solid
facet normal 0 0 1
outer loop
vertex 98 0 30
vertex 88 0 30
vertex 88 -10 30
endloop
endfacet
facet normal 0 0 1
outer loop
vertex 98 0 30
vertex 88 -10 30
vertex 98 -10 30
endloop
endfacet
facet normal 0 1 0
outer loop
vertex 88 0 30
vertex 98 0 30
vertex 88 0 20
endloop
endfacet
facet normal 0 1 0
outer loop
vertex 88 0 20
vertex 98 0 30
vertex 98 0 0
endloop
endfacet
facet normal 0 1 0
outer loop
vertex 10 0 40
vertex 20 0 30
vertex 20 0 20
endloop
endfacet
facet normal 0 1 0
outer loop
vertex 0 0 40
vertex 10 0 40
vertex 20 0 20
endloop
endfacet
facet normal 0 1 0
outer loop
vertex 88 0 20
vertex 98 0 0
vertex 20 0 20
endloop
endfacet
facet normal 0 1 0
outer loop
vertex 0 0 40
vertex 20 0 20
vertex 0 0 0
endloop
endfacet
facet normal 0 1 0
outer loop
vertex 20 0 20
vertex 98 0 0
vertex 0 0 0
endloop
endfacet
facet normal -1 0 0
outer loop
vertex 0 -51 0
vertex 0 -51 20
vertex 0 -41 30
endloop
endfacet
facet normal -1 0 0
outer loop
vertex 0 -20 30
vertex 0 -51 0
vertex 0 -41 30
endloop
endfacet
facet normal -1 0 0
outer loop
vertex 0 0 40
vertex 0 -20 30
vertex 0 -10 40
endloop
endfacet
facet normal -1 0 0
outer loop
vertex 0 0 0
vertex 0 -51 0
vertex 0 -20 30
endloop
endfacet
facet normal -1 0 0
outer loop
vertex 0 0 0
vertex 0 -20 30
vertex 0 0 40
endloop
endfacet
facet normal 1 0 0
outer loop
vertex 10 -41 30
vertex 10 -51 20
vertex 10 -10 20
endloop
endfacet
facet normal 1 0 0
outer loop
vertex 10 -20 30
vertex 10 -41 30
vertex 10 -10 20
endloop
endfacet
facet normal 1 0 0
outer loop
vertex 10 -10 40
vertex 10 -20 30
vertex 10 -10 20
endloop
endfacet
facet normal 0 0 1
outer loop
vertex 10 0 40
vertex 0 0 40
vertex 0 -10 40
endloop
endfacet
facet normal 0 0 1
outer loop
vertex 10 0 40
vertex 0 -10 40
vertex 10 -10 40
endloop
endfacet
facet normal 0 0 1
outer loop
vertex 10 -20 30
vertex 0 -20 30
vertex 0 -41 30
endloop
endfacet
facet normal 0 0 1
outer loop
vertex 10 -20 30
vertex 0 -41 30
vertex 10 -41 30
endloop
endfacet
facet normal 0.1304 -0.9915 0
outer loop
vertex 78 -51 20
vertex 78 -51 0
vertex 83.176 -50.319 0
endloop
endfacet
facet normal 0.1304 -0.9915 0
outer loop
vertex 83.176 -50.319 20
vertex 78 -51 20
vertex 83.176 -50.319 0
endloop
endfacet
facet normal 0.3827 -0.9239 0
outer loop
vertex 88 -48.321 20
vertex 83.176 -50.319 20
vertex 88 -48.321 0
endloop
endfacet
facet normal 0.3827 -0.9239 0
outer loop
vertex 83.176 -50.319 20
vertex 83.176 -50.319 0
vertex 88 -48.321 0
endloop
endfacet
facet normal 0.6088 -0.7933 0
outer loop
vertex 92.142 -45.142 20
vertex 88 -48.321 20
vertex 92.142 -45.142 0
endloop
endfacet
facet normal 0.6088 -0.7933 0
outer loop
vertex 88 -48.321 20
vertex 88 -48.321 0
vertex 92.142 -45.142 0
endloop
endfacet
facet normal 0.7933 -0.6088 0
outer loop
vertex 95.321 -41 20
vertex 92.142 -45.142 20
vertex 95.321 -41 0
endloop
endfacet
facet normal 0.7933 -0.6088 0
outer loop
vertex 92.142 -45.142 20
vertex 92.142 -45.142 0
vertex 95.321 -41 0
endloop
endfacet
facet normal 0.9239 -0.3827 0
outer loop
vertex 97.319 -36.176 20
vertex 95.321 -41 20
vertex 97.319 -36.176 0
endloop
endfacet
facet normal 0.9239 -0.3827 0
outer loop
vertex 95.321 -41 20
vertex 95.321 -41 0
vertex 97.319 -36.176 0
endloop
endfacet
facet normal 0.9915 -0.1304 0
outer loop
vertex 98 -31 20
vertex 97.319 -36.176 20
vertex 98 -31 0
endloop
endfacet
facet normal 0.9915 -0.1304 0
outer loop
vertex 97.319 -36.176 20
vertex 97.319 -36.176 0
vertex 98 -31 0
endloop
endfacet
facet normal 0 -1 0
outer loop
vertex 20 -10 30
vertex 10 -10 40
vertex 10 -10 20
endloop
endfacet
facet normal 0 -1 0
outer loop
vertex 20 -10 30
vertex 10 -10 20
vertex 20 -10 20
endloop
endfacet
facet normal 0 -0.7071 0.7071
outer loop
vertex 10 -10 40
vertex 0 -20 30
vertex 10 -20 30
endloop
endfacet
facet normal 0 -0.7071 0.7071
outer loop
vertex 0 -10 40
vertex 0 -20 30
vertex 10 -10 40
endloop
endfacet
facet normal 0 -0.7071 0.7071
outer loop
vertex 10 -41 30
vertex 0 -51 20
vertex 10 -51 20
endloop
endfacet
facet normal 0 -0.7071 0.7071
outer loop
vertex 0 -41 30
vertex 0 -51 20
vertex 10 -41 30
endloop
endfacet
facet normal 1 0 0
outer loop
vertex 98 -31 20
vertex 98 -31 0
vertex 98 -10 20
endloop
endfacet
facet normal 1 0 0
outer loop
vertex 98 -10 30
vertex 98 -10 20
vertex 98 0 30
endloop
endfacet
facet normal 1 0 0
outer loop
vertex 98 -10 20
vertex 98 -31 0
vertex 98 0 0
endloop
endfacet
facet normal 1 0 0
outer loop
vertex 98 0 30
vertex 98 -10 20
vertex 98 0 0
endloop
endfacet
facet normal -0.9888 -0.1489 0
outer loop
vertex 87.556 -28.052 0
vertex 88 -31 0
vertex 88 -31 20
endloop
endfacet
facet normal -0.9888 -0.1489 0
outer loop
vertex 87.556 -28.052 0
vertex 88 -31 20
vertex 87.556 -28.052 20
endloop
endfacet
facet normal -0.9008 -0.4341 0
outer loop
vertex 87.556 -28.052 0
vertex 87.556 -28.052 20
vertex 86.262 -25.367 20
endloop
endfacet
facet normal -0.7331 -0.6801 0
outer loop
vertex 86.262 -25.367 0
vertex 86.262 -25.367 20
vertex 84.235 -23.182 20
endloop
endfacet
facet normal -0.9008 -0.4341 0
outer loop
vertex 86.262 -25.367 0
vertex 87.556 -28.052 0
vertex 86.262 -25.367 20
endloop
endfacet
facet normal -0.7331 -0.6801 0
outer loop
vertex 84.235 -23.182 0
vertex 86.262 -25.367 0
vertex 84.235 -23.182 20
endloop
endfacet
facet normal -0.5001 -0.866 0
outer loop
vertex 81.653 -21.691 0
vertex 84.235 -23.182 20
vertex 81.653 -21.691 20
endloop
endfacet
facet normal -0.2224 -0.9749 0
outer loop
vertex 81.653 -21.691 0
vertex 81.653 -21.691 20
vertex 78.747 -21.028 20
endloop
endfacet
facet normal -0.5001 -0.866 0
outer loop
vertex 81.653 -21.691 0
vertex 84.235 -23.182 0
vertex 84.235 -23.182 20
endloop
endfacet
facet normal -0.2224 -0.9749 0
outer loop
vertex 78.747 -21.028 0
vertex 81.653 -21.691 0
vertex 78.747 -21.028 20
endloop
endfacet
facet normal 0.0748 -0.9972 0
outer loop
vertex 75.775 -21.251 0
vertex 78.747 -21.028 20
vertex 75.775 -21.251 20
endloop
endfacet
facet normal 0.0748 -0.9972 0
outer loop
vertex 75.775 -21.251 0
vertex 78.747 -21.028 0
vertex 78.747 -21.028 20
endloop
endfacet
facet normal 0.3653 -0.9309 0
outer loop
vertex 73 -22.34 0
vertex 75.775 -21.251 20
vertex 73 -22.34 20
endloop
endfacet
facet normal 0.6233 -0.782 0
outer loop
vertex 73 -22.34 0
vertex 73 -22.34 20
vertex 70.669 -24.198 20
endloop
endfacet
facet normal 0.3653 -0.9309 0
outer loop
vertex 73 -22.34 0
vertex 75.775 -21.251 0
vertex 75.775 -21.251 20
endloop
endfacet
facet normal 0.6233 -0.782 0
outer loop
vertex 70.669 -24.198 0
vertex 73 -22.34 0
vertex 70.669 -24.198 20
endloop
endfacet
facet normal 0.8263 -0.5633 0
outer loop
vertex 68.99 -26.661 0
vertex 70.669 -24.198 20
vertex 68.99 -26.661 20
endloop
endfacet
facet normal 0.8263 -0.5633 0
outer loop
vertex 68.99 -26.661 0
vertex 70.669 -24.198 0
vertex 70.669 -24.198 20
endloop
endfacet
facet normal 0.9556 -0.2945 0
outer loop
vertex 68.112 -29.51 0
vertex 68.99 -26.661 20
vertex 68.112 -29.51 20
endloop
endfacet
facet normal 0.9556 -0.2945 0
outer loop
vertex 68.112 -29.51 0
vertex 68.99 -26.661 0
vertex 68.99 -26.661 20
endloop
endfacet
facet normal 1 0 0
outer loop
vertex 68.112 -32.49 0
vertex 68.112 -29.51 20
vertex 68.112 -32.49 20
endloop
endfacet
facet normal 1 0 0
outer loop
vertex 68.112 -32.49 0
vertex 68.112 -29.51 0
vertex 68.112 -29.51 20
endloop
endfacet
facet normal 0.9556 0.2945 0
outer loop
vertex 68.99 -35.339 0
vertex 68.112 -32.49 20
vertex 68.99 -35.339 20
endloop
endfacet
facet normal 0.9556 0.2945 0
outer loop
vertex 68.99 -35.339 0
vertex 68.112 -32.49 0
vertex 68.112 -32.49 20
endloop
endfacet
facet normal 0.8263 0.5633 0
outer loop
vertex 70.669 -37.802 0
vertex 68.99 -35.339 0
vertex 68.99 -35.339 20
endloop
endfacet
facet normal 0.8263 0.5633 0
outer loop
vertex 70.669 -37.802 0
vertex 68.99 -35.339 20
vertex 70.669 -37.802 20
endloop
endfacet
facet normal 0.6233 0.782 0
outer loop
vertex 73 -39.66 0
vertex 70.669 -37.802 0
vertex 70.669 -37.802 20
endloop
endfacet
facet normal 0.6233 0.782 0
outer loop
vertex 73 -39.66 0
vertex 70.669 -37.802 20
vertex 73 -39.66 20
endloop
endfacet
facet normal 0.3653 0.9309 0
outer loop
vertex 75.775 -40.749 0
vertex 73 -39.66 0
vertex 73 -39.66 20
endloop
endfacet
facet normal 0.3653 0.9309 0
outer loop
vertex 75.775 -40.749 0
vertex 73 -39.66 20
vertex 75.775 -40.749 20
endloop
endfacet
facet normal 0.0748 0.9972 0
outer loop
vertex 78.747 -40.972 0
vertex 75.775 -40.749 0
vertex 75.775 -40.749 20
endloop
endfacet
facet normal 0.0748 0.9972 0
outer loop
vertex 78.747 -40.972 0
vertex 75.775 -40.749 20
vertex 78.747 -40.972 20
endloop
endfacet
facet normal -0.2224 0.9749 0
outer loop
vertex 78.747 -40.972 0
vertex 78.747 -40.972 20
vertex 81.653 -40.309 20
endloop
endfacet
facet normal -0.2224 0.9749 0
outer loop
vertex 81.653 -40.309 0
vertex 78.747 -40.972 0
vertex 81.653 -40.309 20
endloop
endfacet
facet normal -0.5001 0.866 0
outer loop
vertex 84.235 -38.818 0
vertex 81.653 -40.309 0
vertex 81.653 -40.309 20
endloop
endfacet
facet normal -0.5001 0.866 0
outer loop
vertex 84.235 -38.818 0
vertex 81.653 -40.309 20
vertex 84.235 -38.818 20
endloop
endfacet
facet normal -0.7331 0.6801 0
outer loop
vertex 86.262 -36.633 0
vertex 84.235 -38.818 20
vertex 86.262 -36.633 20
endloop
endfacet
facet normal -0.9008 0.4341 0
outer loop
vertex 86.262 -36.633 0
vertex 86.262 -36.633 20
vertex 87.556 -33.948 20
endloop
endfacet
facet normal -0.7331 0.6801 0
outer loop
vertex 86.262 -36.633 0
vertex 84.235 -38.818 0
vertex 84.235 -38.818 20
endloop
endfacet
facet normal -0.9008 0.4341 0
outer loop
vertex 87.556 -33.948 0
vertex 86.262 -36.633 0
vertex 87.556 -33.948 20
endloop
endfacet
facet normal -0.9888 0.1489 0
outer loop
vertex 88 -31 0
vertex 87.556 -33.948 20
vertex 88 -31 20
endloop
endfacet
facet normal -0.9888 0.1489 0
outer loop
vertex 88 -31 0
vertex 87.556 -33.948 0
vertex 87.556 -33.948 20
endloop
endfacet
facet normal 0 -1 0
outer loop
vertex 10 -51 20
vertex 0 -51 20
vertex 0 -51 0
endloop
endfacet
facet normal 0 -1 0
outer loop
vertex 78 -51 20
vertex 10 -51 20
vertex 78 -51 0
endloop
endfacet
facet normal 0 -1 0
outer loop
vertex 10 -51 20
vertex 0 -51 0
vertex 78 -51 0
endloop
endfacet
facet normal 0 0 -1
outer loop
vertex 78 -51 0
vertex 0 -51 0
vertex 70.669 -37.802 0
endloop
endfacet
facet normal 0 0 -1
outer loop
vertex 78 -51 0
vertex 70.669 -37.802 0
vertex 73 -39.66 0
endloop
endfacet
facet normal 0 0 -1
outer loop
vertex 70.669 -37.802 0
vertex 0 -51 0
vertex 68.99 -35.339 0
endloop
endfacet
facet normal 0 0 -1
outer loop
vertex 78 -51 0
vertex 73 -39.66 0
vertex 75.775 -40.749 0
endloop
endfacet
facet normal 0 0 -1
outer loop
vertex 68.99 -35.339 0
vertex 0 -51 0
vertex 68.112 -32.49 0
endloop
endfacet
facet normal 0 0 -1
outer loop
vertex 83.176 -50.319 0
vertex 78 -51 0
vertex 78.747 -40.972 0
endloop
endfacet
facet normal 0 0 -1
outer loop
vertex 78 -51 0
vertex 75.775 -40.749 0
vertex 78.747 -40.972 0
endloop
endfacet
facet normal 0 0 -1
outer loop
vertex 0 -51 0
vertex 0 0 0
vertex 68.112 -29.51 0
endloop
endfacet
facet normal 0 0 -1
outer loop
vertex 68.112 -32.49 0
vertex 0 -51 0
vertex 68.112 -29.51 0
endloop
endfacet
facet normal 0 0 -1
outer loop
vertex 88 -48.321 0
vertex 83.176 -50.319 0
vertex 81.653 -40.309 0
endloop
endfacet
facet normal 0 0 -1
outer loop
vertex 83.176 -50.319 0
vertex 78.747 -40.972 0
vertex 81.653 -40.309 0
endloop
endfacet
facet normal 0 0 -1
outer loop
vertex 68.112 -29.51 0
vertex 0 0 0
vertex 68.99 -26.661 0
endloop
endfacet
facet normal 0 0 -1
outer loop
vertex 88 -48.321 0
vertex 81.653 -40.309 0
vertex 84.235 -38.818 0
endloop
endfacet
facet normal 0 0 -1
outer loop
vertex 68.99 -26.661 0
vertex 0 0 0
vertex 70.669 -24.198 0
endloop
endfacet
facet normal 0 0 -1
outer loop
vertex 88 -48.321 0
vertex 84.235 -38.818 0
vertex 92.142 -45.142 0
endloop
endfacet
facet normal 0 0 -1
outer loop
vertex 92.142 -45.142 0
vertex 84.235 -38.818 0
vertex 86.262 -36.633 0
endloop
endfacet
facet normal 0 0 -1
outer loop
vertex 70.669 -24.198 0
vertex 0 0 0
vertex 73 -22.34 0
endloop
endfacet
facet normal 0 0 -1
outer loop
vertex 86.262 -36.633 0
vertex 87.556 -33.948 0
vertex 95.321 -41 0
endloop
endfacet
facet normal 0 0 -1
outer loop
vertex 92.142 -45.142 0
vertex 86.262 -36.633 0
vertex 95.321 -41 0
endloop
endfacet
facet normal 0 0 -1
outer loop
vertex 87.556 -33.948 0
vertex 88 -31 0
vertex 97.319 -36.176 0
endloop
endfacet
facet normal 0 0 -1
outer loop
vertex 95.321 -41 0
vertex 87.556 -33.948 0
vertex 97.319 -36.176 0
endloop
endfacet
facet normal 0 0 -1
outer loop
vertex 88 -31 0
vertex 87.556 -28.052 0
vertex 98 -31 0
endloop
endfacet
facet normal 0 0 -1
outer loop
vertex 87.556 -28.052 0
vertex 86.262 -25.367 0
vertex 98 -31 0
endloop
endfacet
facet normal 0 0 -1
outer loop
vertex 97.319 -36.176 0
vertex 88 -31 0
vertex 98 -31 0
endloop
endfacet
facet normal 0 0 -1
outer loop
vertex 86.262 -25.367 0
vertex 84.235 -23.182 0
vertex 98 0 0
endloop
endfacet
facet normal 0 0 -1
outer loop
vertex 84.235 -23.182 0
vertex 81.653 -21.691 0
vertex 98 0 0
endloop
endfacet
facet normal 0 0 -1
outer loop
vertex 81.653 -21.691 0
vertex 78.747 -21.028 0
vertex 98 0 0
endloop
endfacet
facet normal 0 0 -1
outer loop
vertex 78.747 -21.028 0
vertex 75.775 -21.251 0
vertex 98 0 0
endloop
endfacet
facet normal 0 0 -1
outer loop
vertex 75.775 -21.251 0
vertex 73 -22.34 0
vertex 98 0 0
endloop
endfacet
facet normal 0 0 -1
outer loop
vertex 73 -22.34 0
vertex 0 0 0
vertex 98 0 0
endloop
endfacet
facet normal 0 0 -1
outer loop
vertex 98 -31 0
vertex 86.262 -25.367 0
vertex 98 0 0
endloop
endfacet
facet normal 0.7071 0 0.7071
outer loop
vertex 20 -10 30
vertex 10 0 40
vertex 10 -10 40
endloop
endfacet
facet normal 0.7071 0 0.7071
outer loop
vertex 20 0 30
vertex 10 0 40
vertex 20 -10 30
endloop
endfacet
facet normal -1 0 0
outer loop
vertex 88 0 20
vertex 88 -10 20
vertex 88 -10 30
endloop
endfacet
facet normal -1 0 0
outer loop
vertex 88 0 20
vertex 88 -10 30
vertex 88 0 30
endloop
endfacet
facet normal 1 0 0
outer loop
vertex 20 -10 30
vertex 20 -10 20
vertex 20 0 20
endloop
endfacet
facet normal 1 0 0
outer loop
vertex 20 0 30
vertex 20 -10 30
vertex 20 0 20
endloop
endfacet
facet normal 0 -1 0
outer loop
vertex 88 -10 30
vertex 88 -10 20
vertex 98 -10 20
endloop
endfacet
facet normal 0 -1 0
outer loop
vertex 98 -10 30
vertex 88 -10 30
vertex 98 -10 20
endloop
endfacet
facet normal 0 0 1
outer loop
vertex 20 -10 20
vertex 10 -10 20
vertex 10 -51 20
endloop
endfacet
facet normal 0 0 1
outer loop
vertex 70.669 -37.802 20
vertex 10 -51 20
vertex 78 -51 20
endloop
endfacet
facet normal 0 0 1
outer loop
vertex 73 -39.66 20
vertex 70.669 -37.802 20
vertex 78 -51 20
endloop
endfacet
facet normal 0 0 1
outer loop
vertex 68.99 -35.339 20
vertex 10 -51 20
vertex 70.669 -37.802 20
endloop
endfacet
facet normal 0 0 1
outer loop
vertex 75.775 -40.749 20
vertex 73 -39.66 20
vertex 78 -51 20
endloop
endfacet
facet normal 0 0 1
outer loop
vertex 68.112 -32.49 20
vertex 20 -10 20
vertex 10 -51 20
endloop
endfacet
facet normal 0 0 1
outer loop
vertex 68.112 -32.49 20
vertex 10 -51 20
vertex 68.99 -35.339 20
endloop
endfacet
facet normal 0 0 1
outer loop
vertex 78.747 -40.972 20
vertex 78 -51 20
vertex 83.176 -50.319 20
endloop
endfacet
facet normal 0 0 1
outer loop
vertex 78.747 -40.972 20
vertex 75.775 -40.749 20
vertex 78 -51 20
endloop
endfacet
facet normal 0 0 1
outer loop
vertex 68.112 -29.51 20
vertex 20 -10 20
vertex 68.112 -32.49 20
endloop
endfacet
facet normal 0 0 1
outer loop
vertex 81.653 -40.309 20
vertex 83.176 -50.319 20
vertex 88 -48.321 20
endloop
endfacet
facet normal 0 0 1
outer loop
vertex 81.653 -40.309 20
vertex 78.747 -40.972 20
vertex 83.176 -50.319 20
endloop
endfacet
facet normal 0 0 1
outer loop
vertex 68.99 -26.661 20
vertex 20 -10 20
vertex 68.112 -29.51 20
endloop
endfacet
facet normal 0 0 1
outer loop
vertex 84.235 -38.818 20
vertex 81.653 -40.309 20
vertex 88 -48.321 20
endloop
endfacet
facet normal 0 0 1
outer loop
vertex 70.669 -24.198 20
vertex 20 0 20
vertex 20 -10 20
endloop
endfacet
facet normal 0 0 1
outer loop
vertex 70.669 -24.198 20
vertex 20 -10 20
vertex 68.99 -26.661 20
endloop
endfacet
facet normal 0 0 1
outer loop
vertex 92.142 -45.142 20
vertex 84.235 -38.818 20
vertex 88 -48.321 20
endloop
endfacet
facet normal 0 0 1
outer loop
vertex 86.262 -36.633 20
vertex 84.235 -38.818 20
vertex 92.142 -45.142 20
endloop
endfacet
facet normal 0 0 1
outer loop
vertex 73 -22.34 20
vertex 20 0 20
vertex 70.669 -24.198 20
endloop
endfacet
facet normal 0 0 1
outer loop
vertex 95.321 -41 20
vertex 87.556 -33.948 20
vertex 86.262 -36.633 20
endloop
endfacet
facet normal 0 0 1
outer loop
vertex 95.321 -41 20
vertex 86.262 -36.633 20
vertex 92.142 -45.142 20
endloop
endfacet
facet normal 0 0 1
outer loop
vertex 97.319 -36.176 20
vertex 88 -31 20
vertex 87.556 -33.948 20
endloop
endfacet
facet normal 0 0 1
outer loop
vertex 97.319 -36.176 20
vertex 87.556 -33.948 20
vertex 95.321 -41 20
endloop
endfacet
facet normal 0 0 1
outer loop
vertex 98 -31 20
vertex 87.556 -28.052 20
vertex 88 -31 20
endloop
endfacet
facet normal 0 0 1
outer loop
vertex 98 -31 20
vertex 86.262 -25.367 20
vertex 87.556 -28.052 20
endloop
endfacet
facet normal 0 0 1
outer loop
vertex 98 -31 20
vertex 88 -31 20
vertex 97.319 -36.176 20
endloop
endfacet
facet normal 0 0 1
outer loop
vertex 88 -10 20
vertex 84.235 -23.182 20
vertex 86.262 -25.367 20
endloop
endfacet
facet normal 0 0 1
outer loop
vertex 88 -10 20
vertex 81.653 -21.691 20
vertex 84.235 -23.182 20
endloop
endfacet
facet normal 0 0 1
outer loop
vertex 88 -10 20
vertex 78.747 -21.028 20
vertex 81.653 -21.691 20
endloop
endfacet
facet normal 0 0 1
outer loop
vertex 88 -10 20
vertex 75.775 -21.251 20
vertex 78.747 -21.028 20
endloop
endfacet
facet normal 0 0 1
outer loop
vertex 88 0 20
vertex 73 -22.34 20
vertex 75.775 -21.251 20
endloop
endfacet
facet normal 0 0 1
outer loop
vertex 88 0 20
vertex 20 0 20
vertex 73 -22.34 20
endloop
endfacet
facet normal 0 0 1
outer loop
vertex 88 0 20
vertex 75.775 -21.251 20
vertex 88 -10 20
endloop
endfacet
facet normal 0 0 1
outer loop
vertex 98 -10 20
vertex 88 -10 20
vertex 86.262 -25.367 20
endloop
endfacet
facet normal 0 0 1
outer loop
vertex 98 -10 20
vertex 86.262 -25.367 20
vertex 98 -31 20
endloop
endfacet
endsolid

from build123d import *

# Parameters (mm, degrees)
SKETCH2_W               = 10
SKETCH2_H               = 10
BOSS_EXTRUDE2_DEPTH     = 30
SKETCH2_5_R             = 10
BOSS_EXTRUDE3_DEPTH     = 20
SKETCH2_6_W             = 10
SKETCH2_6_H             = 10
BOSS_EXTRUDE4_DEPTH     = 40
SKETCH2_7_W             = 10
SKETCH2_7_H             = 21
BOSS_EXTRUDE5_DEPTH     = 30
SKETCH2_8_W             = 10
SKETCH2_8_H             = 10
BOSS_EXTRUDE6_DEPTH     = 40
SKETCH2_9_W             = 10
SKETCH2_9_H             = 10
BOSS_EXTRUDE7_DEPTH     = 30
SKETCH2_10_W            = 10
SKETCH2_10_H            = 10
BOSS_EXTRUDE8_DEPTH     = 40
CUT_EXTRUDE3_DEPTH      = 114.512113891
CUT_EXTRUDE3_DEPTH_BACK = 10
CUT_EXTRUDE5_START      = -10
CUT_EXTRUDE5_DEPTH      = 10
CUT_EXTRUDE6_DEPTH      = 110.293183685
CUT_EXTRUDE6_DEPTH_BACK = 10


# Read off the part's stored shape, not the designer's step: Cut-Extrude5
with BuildPart() as part:
    # Sketch2 → Boss-Extrude2 (new body)
    with BuildSketch(Plane.XY):
        with Locations((93, -5)):
            Rectangle(SKETCH2_W, SKETCH2_H)
    extrude(amount=BOSS_EXTRUDE2_DEPTH)

    # Sketch2<5> → Boss-Extrude3 (add)
    with BuildSketch(Plane.XY):
        with BuildLine():
            Line((88, 0), (20, 0))
            Line((20, 0), (20, -10))
            Line((20, -10), (10, -10))
            Line((10, -10), (10, -20))
            Line((10, -20), (10, -41))
            Line((10, -41), (10, -51))
            Line((10, -51), (78, -51))
            ThreePointArc((78, -51), (92.142135624, -45.142135624), (98, -31))
            Line((98, -31), (98, -10))
            Line((98, -10), (88, -10))
            Line((88, -10), (88, 0))
        make_face()
        with Locations((78, -31)):
            Circle(SKETCH2_5_R, mode=Mode.SUBTRACT)
    extrude(amount=BOSS_EXTRUDE3_DEPTH)

    # Sketch2<7> → Boss-Extrude5 (add)
    with BuildSketch(Plane.XY):
        with Locations((5, -30.5)):
            Rectangle(SKETCH2_7_W, SKETCH2_7_H)
    extrude(amount=BOSS_EXTRUDE5_DEPTH)



with BuildPart() as body_2:
    # Sketch2<6> → Boss-Extrude4 (new body)
    with BuildSketch(Plane.XY):
        with Locations((5, -5)):
            Rectangle(SKETCH2_6_W, SKETCH2_6_H)
    extrude(amount=BOSS_EXTRUDE4_DEPTH)


with BuildPart() as part_1:
    add(part.part)

    add(body_2.part)  # Boss-Extrude6 merges body 2
    # Sketch2<8> → Boss-Extrude6 (add)
    with BuildSketch(Plane.XY):
        with Locations((15, -5)):
            Rectangle(SKETCH2_8_W, SKETCH2_8_H)
    extrude(amount=BOSS_EXTRUDE6_DEPTH)

    # Sketch2<9> → Boss-Extrude7 (add)
    with BuildSketch(Plane.XY):
        with Locations((5, -46)):
            Rectangle(SKETCH2_9_W, SKETCH2_9_H)
    extrude(amount=BOSS_EXTRUDE7_DEPTH)

    # Sketch2<10> → Boss-Extrude8 (add)
    with BuildSketch(Plane.XY):
        with Locations((5, -15)):
            Rectangle(SKETCH2_10_W, SKETCH2_10_H)
    extrude(amount=BOSS_EXTRUDE8_DEPTH)

    # Sketch6 → Cut-Extrude3 (cut, two sides: drawn at the far end of the back side and taken through both)
    with BuildSketch(Plane.XZ.offset(10).offset(-CUT_EXTRUDE3_DEPTH_BACK)):
        Polygon((20, 40), (10, 40), (20, 30), align=None)
    extrude(amount=CUT_EXTRUDE3_DEPTH + CUT_EXTRUDE3_DEPTH_BACK, mode=Mode.SUBTRACT)

    # Cut-Extrude5 outline → Cut-Extrude5 (cut)
    with BuildSketch(Plane(origin=(10, 0, 0), x_dir=(0, 0, -1), z_dir=(1, 0, 0)).offset(CUT_EXTRUDE5_START)):
        Polygon((-40, -20), (-30, -20), (-40, -10), align=None)
    extrude(amount=CUT_EXTRUDE5_DEPTH, mode=Mode.SUBTRACT)

    # Sketch8 → Cut-Extrude6 (cut, two sides: drawn at the far end of the back side and taken through both)
    with BuildSketch(Plane(origin=(10, 0, 0), x_dir=(0, 0, -1), z_dir=(1, 0, 0)).offset(-CUT_EXTRUDE6_DEPTH_BACK)):
        Polygon((64.543643605, -135.543643605), (-20, -51), (-30, -41), (-114.543643605, 43.543643605), (-283.630930815, -125.543643605), (-104.543643605, -304.630930815), align=None)
    extrude(amount=CUT_EXTRUDE6_DEPTH + CUT_EXTRUDE6_DEPTH_BACK, mode=Mode.SUBTRACT)


solid = part_1.part
